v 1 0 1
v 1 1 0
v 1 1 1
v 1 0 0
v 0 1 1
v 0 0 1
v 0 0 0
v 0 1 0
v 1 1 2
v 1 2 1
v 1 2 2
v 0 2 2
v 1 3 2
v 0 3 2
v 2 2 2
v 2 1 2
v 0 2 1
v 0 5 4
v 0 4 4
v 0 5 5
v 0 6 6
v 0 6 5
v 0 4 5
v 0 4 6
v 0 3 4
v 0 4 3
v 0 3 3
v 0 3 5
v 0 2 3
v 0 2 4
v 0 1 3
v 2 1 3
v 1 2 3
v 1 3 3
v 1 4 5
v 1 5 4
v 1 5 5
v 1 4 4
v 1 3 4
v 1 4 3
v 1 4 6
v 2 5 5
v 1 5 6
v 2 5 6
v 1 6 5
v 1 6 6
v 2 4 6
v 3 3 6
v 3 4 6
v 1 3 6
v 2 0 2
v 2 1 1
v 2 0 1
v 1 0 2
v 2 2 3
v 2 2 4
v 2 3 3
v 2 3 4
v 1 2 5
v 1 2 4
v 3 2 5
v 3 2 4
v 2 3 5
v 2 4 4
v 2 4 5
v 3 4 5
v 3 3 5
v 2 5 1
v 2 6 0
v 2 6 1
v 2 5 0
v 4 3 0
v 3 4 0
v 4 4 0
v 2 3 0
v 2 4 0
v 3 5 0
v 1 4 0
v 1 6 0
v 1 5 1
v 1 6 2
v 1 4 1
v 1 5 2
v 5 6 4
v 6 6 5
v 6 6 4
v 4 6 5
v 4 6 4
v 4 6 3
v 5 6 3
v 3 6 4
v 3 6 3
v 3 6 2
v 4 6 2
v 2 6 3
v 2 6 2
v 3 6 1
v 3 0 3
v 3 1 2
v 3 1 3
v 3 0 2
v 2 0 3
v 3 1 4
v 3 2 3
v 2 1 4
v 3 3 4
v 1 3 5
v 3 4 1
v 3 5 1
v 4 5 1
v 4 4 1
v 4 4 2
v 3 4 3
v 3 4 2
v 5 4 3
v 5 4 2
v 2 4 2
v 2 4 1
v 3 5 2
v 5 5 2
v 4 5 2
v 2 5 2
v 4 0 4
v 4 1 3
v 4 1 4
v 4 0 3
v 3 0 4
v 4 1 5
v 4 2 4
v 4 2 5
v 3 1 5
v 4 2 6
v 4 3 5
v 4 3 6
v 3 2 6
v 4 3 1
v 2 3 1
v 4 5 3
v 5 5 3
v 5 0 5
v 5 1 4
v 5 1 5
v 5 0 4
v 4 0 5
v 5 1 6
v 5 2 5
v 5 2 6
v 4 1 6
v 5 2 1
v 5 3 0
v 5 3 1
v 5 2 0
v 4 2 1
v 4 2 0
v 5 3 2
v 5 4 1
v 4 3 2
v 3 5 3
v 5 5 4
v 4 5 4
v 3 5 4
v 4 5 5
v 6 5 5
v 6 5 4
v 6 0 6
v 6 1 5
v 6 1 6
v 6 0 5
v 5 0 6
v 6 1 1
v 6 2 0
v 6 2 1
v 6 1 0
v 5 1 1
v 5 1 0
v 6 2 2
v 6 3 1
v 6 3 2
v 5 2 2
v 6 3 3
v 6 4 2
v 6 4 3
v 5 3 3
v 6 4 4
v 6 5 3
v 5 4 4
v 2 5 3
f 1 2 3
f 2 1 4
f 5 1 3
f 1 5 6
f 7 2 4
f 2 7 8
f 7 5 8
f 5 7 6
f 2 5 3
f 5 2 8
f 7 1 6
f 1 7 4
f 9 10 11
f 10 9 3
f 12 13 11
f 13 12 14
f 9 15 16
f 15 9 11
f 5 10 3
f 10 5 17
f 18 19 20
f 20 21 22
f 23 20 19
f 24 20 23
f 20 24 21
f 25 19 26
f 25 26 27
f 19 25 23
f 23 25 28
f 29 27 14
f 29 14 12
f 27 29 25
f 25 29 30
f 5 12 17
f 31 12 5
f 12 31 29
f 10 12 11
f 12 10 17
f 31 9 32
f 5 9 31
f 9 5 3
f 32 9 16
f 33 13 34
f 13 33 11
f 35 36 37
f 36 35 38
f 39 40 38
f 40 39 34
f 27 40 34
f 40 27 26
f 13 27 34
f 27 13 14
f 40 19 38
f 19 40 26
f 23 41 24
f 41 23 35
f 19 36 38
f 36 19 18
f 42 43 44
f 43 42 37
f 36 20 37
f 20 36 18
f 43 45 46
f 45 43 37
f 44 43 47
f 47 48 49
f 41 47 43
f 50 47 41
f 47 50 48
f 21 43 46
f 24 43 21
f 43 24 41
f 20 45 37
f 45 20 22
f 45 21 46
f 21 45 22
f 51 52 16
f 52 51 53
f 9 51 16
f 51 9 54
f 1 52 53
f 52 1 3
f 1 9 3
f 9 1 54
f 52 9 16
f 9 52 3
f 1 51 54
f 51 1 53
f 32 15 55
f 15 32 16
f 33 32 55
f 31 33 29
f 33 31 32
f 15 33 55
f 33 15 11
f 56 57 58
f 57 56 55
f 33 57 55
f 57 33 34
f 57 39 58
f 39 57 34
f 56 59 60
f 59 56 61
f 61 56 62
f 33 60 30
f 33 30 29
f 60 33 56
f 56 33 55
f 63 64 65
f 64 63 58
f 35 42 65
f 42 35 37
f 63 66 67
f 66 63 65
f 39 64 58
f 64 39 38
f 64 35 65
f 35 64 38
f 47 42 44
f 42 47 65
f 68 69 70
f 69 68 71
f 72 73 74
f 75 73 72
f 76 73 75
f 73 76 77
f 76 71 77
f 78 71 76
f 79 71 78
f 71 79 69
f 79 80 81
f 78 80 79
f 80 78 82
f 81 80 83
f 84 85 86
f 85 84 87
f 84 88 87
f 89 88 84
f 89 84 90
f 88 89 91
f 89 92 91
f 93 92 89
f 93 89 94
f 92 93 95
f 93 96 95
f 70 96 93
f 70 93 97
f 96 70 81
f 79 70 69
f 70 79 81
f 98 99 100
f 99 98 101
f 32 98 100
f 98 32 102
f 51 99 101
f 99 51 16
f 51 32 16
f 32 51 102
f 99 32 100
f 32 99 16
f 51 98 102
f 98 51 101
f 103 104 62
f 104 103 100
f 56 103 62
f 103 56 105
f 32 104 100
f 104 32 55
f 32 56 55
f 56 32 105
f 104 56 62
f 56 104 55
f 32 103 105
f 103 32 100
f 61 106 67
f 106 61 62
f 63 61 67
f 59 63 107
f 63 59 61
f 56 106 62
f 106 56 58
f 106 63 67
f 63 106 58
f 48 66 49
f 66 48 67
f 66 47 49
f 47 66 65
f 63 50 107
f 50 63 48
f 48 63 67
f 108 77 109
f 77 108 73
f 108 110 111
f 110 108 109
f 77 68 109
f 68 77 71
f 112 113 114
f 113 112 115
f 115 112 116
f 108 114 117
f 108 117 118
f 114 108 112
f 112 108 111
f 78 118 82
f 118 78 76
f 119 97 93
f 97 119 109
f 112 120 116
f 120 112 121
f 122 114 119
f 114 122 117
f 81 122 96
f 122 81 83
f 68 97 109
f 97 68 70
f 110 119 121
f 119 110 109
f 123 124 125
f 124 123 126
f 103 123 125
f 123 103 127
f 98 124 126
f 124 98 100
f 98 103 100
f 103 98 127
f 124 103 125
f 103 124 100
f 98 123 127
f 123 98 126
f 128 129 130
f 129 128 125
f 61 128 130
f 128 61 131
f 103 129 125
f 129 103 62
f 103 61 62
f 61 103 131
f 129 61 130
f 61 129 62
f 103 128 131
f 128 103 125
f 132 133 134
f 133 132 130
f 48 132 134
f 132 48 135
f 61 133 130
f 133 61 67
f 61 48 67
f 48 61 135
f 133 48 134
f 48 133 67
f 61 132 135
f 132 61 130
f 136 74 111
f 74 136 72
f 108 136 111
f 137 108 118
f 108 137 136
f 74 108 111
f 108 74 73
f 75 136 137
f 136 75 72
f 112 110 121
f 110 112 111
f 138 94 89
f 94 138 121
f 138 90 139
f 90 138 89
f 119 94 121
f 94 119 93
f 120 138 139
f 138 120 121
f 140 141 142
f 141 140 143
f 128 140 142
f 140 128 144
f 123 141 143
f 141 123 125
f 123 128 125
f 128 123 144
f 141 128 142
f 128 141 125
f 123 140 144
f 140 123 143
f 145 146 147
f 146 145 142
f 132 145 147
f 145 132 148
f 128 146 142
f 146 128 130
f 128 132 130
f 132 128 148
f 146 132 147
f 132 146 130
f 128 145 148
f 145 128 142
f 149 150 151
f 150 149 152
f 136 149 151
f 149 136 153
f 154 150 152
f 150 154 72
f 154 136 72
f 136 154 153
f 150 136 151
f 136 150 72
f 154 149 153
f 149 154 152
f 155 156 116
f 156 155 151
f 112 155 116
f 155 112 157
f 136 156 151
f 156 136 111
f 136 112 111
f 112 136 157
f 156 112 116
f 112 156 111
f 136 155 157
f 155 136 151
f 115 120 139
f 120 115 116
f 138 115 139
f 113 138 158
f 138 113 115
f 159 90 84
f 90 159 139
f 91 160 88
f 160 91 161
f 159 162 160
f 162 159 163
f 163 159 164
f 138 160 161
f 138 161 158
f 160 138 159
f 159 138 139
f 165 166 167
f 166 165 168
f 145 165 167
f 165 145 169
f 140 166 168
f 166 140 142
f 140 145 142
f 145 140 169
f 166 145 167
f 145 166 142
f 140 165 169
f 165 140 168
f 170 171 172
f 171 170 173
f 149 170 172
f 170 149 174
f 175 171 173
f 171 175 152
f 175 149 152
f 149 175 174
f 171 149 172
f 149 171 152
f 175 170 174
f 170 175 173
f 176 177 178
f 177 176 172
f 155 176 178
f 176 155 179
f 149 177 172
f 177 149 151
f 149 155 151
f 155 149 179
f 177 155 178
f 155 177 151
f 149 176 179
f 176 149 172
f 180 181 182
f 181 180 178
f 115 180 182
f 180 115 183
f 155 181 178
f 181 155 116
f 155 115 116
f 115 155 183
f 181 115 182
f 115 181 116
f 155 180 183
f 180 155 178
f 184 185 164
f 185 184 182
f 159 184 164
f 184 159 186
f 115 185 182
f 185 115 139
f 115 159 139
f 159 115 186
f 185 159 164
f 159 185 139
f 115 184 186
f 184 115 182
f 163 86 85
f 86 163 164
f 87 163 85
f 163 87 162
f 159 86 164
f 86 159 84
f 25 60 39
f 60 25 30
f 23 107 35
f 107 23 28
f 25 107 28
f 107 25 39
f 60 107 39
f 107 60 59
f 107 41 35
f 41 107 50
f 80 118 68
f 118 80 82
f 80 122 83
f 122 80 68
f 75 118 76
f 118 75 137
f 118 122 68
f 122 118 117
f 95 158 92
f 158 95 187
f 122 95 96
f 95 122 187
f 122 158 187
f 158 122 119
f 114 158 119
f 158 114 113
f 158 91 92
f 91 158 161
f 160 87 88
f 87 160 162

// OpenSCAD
union() {
    translate([0, 0, 0]) cube([1, 1, 1]);
    translate([0, 1, 1]) cube([1, 1, 1]);
    translate([0, 2, 2]) cube([1, 1, 1]);
    translate([0, 3, 3]) cube([1, 1, 1]);
    translate([0, 4, 4]) cube([1, 1, 1]);
    translate([0, 5, 5]) cube([1, 1, 1]);
    translate([1, 0, 1]) cube([1, 1, 1]);
    translate([1, 1, 2]) cube([1, 1, 1]);
    translate([1, 2, 3]) cube([1, 1, 1]);
    translate([1, 3, 4]) cube([1, 1, 1]);
    translate([1, 4, 5]) cube([1, 1, 1]);
    translate([1, 5, 0]) cube([1, 1, 1]);
    translate([2, 0, 2]) cube([1, 1, 1]);
    translate([2, 1, 3]) cube([1, 1, 1]);
    translate([2, 2, 4]) cube([1, 1, 1]);
    translate([2, 3, 5]) cube([1, 1, 1]);
    translate([2, 4, 0]) cube([1, 1, 1]);
    translate([2, 5, 1]) cube([1, 1, 1]);
    translate([3, 0, 3]) cube([1, 1, 1]);
    translate([3, 1, 4]) cube([1, 1, 1]);
    translate([3, 2, 5]) cube([1, 1, 1]);
    translate([3, 3, 0]) cube([1, 1, 1]);
    translate([3, 4, 1]) cube([1, 1, 1]);
    translate([3, 5, 2]) cube([1, 1, 1]);
    translate([4, 0, 4]) cube([1, 1, 1]);
    translate([4, 1, 5]) cube([1, 1, 1]);
    translate([4, 2, 0]) cube([1, 1, 1]);
    translate([4, 3, 1]) cube([1, 1, 1]);
    translate([4, 4, 2]) cube([1, 1, 1]);
    translate([4, 5, 3]) cube([1, 1, 1]);
    translate([5, 0, 5]) cube([1, 1, 1]);
    translate([5, 1, 0]) cube([1, 1, 1]);
    translate([5, 2, 1]) cube([1, 1, 1]);
    translate([5, 3, 2]) cube([1, 1, 1]);
    translate([5, 4, 3]) cube([1, 1, 1]);
    translate([5, 5, 4]) cube([1, 1, 1]);
    translate([0, 1, 2]) cube([1, 1, 1]);
    translate([0, 2, 3]) cube([1, 1, 1]);
    translate([0, 3, 4]) cube([1, 1, 1]);
    translate([0, 4, 5]) cube([1, 1, 1]);
    translate([1, 2, 4]) cube([1, 1, 1]);
    translate([1, 3, 5]) cube([1, 1, 1]);
    translate([1, 4, 0]) cube([1, 1, 1]);
    translate([1, 5, 1]) cube([1, 1, 1]);
    translate([2, 3, 0]) cube([1, 1, 1]);
    translate([2, 4, 1]) cube([1, 1, 1]);
    translate([2, 5, 2]) cube([1, 1, 1]);
    translate([3, 4, 2]) cube([1, 1, 1]);
    translate([3, 5, 3]) cube([1, 1, 1]);
    translate([4, 5, 4]) cube([1, 1, 1]);
}
